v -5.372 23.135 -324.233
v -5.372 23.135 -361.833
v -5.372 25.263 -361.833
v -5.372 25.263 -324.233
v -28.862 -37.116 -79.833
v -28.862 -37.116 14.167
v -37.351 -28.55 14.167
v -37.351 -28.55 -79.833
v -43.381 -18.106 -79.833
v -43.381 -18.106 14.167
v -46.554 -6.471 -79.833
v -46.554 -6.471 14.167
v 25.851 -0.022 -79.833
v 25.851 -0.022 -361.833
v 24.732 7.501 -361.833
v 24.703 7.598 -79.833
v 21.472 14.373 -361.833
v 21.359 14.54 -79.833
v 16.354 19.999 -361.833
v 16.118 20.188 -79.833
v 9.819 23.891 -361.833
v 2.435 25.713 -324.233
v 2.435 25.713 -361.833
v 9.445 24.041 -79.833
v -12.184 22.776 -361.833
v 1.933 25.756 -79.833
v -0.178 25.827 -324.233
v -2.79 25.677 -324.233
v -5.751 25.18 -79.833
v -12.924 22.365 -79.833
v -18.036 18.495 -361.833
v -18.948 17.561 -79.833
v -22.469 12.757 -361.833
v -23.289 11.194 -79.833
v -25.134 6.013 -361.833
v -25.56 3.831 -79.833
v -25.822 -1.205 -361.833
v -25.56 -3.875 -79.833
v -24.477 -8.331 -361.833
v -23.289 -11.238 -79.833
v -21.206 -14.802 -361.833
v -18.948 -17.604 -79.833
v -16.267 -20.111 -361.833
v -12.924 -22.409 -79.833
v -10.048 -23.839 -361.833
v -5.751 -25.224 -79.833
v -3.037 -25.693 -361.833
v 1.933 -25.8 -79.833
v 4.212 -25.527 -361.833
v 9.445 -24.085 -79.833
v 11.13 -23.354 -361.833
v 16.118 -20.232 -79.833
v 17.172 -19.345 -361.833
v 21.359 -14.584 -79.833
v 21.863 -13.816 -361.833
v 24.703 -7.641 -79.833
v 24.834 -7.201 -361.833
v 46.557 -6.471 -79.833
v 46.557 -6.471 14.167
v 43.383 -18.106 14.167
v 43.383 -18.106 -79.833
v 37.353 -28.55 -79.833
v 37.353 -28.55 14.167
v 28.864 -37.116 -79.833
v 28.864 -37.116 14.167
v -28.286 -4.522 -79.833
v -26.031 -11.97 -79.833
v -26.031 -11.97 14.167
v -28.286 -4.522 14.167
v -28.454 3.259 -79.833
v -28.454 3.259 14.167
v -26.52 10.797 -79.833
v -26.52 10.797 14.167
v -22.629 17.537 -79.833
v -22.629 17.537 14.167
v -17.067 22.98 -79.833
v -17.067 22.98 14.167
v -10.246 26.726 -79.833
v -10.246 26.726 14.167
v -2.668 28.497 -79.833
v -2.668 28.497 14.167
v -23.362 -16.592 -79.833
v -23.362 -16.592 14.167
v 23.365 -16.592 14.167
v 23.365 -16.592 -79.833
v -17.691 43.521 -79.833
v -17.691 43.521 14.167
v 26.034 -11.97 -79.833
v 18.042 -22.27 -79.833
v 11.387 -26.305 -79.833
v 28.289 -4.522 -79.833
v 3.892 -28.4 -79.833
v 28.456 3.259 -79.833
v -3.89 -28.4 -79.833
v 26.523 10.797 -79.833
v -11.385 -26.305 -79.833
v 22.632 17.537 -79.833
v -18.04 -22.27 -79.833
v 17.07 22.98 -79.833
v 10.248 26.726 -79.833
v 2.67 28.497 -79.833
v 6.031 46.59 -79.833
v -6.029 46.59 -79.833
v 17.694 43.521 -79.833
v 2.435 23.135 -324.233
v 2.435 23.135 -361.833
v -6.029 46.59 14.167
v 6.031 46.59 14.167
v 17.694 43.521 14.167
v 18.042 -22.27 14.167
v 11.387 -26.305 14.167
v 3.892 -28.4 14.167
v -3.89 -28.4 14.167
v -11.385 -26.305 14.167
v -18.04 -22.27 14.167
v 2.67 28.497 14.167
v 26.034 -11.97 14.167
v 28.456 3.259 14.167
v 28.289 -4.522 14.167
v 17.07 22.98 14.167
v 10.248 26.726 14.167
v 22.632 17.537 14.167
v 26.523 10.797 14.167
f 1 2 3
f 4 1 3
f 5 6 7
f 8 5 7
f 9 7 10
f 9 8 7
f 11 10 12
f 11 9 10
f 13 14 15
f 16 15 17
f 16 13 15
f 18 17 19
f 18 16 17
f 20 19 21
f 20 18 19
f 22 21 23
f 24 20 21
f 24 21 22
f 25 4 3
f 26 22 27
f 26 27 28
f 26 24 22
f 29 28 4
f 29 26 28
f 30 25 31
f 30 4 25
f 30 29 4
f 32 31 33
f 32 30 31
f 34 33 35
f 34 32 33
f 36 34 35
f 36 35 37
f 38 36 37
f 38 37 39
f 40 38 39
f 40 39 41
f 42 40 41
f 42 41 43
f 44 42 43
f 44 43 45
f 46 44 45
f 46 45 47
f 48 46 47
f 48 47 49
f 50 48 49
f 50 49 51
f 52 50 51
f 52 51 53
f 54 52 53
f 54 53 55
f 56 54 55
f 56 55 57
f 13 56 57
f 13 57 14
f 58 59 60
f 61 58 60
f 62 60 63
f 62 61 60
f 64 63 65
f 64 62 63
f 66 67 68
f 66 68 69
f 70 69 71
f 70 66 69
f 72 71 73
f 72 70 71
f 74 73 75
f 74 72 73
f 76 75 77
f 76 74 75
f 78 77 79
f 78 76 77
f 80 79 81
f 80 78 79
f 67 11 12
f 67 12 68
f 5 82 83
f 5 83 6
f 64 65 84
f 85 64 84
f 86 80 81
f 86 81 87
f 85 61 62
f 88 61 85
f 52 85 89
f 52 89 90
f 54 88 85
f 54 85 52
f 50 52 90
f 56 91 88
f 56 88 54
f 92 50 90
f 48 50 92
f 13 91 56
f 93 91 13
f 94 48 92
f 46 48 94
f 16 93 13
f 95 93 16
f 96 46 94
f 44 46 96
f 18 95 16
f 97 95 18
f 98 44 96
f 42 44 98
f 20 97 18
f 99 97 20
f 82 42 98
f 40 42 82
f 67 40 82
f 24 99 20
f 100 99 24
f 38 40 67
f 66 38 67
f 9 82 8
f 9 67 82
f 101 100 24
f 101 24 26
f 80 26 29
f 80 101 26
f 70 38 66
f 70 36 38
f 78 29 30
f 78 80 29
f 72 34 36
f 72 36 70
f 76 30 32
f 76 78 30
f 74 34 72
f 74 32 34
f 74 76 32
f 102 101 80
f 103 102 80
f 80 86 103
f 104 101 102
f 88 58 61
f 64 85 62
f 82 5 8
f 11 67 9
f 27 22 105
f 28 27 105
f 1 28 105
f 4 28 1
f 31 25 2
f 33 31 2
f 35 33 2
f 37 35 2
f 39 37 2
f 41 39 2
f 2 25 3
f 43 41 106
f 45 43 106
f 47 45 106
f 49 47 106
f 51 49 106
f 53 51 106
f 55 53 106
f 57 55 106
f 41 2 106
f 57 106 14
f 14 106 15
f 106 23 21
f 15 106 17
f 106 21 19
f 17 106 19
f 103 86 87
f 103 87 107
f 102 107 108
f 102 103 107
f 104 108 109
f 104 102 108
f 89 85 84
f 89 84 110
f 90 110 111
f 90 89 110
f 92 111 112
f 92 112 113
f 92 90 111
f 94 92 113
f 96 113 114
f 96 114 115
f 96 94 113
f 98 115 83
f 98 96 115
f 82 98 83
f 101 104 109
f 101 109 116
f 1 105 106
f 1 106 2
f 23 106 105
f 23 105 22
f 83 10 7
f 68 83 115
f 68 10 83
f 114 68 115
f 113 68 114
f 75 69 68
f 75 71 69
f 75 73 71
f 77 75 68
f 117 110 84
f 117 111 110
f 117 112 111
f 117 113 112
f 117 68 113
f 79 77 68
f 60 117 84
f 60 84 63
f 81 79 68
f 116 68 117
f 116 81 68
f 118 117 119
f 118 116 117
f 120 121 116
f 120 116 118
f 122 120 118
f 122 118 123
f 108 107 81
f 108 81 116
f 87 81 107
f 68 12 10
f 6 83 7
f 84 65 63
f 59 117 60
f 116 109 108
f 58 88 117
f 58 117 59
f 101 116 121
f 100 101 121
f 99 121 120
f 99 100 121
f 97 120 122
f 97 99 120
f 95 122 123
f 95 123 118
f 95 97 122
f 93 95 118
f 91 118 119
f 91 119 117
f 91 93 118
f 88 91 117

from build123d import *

# Parameters (mm, degrees)
BOSS_EXTRUDE1_DEPTH = 200
SKETCH2_R           = 55
BOSS_EXTRUDE2_DEPTH = 800
SKETCH4_W           = 16.611577021
SKETCH4_H           = 12.619068182
CUT_EXTRUDE1_DEPTH  = 80
ECHELLE1_SCALE      = 0.47


with BuildPart() as part:
    # Sketch1 → Boss-Extrude1 (new body)
    with BuildSketch(Plane.XY):
        with BuildLine():
            Line((-5.678147225, 60.678147225), (-37.644071104, 92.644071104))
            ThreePointArc((-37.644071104, 92.644071104), (0, 100), (37.644071104, 92.644071104))
            Line((37.644071104, 92.644071104), (5.678147225, 60.678147225))
            ThreePointArc((5.678147225, 60.678147225), (52.778396906, 30.471621661), (55.387890564, -25.421653869))
            Line((55.387890564, -25.421653869), (99.054154638, -13.721313674))
            ThreePointArc((99.054154638, -13.721313674), (86.602540378, -50), (61.410083534, -78.92275743))
            Line((61.410083534, -78.92275743), (49.709743339, -35.256493356))
            ThreePointArc((49.709743339, -35.256493356), (0, -60.943243322), (-49.709743339, -35.256493356))
            Line((-49.709743339, -35.256493356), (-61.410083534, -78.92275743))
            ThreePointArc((-61.410083534, -78.92275743), (-86.602540378, -50), (-99.054154638, -13.721313674))
            Line((-99.054154638, -13.721313674), (-55.387890564, -25.421653869))
            ThreePointArc((-55.387890564, -25.421653869), (-52.778396906, 30.471621661), (-5.678147225, 60.678147225))
        make_face()
    extrude(amount=BOSS_EXTRUDE1_DEPTH)

    # Sketch2 → Boss-Extrude2 (add)
    with BuildSketch(Plane.XY.offset(200)):
        Circle(SKETCH2_R)
    extrude(amount=-BOSS_EXTRUDE2_DEPTH)

    # Sketch4 → Cut-Extrude1 (cut)
    with BuildSketch(Plane(origin=(0, 0, -600), x_dir=(-1, 0, 0), z_dir=(0, 0, -1))):
        with Locations((3.127329512, 55.580565651)):
            Rectangle(SKETCH4_W, SKETCH4_H)
    extrude(amount=-CUT_EXTRUDE1_DEPTH, mode=Mode.SUBTRACT)


with BuildPart() as part_1:
    # Echelle1: scaled about (0.002291637, -0.041310048, -150.628565955)
    add(part.part.scale(ECHELLE1_SCALE).moved(Location((0.001214568, -0.021894325, -79.833139956))))


solid = part_1.part
